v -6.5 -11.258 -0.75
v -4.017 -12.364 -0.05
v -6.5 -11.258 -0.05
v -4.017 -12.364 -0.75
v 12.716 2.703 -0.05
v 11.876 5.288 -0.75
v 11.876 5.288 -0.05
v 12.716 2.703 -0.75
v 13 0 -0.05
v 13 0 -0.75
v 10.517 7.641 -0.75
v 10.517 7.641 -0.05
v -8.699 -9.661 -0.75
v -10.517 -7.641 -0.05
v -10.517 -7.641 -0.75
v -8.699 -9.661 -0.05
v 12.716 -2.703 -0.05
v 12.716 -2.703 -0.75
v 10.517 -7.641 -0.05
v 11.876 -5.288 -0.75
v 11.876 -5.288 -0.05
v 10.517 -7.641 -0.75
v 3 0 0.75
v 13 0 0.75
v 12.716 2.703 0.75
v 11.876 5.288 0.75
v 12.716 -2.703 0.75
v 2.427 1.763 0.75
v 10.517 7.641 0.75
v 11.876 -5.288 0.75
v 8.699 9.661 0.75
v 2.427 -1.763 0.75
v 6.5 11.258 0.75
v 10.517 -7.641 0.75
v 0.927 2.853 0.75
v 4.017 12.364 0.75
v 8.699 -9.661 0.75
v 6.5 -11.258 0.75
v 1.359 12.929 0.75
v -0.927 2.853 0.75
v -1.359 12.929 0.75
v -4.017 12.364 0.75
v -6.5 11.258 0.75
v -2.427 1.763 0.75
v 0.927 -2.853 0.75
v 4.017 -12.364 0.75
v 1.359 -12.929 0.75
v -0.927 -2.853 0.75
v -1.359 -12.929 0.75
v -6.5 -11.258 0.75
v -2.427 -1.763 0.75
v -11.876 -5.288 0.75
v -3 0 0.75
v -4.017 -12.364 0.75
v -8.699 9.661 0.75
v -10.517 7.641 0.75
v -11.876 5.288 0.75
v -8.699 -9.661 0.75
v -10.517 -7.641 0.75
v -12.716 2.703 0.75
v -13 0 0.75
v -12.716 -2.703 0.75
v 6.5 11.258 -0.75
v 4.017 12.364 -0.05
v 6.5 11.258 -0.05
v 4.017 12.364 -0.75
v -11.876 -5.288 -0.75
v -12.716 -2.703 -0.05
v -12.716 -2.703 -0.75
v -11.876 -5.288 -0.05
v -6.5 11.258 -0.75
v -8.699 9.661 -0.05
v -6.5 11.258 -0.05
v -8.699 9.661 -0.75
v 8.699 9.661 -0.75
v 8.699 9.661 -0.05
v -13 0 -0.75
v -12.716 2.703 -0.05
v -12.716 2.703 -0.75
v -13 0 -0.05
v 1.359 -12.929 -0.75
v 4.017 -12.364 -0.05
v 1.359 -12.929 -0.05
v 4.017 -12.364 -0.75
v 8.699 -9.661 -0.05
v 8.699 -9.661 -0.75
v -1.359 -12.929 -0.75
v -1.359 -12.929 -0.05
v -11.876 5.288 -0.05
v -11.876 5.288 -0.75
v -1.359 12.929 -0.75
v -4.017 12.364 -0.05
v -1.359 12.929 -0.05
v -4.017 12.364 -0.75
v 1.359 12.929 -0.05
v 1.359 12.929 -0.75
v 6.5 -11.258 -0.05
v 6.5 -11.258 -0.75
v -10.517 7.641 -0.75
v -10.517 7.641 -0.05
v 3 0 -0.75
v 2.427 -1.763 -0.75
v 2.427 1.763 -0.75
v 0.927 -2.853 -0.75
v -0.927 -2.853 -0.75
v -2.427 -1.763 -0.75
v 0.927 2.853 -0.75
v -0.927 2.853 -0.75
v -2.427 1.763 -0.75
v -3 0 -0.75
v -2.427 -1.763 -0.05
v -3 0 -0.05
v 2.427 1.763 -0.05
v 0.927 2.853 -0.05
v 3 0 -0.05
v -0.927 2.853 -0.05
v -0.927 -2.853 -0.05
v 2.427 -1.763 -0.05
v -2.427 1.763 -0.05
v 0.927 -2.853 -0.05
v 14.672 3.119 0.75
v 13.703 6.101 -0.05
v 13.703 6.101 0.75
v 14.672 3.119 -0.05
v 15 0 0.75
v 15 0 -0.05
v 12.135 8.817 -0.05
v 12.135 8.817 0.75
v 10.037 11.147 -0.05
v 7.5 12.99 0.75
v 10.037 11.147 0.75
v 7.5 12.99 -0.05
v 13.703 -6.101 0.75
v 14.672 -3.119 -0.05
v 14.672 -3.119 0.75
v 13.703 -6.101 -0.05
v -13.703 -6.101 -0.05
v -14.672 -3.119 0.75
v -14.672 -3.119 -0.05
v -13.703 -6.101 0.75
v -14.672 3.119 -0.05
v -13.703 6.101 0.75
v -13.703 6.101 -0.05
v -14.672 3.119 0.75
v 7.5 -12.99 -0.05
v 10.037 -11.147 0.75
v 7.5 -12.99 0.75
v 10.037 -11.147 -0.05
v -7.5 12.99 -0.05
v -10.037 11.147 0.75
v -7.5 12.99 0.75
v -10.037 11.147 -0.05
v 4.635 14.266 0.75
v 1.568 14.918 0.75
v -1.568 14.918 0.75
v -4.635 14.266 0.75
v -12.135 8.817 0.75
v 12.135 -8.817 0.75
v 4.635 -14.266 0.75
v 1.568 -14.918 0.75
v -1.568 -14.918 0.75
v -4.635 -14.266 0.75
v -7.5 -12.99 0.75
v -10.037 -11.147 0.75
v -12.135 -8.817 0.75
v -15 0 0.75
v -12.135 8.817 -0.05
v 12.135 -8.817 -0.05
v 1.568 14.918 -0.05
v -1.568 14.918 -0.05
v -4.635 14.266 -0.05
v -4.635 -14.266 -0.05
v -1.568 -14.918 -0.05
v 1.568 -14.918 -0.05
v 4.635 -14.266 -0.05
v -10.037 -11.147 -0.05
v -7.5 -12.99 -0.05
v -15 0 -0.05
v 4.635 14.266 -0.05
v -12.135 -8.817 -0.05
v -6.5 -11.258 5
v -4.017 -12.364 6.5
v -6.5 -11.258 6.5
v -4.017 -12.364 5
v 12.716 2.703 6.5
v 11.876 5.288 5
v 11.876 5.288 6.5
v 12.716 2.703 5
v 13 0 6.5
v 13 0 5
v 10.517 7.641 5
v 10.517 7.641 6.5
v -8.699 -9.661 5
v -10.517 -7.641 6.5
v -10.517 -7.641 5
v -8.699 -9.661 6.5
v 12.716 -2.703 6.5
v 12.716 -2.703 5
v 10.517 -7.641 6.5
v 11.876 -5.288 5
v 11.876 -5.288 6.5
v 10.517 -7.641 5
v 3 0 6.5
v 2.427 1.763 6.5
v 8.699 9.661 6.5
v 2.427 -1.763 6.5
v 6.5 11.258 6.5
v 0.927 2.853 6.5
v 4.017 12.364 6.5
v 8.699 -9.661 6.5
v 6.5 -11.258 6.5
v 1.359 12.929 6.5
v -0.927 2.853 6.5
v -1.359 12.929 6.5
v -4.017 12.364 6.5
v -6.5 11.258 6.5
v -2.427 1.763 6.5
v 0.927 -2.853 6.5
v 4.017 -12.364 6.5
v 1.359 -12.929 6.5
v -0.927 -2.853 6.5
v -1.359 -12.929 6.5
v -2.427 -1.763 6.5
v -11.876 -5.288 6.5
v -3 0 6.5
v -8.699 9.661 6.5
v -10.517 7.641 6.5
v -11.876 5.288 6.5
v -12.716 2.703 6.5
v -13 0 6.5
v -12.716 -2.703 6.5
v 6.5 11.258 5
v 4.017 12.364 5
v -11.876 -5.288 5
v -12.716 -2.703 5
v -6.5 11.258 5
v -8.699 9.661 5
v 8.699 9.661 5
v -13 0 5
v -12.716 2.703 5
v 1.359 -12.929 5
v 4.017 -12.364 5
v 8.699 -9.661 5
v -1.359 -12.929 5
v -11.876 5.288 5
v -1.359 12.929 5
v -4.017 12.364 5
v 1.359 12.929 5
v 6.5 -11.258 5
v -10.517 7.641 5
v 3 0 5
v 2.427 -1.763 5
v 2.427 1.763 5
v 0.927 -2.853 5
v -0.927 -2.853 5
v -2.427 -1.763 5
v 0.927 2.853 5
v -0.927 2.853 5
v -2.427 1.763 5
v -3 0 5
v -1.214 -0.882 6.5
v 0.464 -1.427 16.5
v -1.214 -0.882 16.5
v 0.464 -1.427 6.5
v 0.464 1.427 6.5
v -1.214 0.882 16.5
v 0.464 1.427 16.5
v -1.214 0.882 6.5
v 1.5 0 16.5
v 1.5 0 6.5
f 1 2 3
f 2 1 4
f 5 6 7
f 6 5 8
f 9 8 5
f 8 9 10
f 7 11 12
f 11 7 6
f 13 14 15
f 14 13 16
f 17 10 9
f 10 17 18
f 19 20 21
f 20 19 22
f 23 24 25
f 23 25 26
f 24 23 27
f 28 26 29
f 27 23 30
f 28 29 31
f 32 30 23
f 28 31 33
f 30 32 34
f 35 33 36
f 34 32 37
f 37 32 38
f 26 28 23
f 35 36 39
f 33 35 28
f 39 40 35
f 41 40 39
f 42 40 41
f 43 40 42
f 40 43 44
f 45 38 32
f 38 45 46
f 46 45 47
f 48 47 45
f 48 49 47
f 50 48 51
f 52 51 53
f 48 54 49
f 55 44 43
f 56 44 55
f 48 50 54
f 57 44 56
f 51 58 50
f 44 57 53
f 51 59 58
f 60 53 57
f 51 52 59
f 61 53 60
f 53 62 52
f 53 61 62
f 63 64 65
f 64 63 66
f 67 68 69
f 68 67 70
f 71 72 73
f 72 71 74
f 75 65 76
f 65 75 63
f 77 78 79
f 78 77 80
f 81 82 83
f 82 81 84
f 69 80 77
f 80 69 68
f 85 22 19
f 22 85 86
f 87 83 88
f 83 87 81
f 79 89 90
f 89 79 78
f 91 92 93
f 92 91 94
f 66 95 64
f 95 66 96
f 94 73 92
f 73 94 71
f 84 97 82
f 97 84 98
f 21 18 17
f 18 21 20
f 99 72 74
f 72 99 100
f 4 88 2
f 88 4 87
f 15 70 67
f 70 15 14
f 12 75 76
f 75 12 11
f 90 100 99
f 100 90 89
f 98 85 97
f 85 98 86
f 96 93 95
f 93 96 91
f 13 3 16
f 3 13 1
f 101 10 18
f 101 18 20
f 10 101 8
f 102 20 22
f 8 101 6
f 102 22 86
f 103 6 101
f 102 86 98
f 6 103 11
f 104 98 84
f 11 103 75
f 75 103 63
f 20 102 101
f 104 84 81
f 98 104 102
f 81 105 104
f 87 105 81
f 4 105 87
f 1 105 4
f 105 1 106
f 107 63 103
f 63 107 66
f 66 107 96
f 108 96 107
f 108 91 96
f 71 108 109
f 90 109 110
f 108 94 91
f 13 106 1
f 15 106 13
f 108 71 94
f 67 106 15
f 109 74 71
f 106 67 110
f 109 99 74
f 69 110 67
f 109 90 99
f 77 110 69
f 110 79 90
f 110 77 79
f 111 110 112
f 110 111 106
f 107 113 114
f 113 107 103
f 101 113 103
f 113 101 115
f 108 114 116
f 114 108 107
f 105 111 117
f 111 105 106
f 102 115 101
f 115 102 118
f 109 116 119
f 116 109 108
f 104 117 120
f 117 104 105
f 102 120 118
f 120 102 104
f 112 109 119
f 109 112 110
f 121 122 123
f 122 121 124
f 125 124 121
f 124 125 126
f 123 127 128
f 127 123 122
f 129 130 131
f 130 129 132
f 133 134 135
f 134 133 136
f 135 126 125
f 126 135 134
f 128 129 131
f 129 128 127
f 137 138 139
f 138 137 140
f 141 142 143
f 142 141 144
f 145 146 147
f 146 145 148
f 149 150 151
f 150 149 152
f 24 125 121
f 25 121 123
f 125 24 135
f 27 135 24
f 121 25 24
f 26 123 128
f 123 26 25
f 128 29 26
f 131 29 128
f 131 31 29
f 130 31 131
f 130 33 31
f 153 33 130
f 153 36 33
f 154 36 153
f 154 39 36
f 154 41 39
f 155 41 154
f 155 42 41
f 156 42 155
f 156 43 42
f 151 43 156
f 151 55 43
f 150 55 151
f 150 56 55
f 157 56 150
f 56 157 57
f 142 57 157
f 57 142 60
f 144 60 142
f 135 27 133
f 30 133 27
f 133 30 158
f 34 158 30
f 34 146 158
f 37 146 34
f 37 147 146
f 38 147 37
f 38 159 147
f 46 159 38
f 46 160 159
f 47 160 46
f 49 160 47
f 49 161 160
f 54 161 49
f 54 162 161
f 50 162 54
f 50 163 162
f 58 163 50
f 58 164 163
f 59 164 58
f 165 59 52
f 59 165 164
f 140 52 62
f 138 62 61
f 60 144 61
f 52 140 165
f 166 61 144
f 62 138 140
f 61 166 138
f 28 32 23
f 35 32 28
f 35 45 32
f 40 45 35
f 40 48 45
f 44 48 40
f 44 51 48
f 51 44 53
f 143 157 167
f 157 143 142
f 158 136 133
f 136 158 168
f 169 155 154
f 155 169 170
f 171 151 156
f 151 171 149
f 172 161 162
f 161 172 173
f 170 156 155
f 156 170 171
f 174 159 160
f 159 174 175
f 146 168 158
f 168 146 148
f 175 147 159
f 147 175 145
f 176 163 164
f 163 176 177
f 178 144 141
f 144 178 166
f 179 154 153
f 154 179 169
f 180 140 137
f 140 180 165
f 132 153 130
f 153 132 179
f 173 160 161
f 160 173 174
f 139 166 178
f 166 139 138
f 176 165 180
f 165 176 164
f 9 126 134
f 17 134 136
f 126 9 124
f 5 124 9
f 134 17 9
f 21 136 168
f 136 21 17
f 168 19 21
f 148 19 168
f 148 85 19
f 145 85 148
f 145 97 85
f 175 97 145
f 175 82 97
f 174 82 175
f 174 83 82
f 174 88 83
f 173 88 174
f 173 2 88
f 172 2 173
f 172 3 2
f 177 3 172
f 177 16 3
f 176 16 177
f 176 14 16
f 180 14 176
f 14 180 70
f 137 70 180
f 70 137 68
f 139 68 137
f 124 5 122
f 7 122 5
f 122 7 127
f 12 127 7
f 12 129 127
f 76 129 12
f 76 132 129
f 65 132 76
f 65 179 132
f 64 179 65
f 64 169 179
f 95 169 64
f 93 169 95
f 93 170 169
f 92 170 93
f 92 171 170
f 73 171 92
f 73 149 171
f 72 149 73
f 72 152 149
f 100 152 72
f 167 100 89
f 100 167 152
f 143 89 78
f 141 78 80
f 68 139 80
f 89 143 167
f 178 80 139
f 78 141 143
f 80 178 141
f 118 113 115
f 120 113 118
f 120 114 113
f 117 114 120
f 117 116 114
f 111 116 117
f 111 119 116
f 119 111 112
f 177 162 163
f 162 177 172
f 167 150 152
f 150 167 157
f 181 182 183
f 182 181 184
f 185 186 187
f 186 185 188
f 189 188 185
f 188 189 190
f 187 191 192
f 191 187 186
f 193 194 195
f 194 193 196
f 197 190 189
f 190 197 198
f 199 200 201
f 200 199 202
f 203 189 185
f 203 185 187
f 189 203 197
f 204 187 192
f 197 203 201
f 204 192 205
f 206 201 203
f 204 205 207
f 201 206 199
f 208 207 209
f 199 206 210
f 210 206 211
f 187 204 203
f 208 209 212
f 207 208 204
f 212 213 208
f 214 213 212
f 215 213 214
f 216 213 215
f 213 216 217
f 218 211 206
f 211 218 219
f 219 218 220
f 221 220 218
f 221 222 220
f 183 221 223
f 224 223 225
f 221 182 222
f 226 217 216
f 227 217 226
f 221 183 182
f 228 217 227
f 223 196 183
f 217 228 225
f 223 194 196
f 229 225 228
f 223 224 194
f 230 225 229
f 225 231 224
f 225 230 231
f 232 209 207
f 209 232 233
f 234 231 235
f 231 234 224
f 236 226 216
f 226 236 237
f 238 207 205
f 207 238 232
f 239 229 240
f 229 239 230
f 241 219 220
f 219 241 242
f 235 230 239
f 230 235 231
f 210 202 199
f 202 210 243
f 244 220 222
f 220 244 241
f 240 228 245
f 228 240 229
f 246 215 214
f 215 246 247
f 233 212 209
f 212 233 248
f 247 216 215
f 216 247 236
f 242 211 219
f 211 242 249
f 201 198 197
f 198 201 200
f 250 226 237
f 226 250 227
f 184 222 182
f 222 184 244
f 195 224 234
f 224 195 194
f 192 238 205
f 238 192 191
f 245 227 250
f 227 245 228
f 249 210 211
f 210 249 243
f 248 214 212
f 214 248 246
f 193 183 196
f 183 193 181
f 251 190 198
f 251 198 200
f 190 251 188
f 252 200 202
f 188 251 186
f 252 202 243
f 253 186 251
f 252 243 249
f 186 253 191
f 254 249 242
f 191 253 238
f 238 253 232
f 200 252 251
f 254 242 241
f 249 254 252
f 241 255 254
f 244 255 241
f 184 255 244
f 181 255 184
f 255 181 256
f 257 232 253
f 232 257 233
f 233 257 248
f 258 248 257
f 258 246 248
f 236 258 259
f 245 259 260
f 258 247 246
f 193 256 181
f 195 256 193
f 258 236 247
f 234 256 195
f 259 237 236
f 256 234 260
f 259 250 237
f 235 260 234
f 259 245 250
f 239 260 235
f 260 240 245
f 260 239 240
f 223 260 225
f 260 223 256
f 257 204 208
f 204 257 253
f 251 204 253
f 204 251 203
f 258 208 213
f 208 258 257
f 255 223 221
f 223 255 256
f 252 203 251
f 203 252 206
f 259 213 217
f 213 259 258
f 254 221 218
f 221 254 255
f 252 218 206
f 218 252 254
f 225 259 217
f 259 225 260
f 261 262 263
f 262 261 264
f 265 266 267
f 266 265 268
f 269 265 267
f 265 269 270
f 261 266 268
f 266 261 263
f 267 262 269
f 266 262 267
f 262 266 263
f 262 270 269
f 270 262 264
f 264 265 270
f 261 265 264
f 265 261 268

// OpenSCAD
// Parameters
inner_diameter = 6; //[3:12:0.1]
outer_diameter = 26; //[13:52:0.1]
thickness = 1.5; //[0.75:3:0.05]
eps = 0.8; //[0.2:2:0.1]
grommet_lip_thickness = 0.8; //[0.4:2:0.1]
grommet_lip_radial = 2; //[1:6:0.1]

// Penny Washer - complete geometry
module penny_washer() {
  color("Silver") {
    difference() {
      // Washer body
      cylinder(r=outer_diameter/2, h=thickness, center=true);
      // Inner through-hole
      translate([0, 0, -eps])
        cylinder(r=inner_diameter/2, h=thickness + 2*eps, center=true);
    }
  }
}

// Round Grommet Top - complete geometry
module round_grommet_top() {
  color("DimGray") {
    translate([0, 0, thickness/2 + grommet_lip_thickness/2 - eps])
      cylinder(r=outer_diameter/2 + grommet_lip_radial, h=grommet_lip_thickness, center=true);
  }
}

// Round Grommet Assembly - complete geometry
module round_grommet_assembly() {
  union() {
    penny_washer();
    round_grommet_top();
  }
}

// Screw And Washer - complete geometry
module screw_and_washer() {
  color("Black") {
    // Placeholder for screw geometry
    translate([0, 0, thickness/2 + 5])
      cylinder(r=inner_diameter/4, h=10, center=true);
    // Washer
    penny_washer();
  }
}

// Assembly
module assembly() {
  round_grommet_assembly();
  translate([0, 0, thickness/2 + 5])
    screw_and_washer();
}

assembly();
